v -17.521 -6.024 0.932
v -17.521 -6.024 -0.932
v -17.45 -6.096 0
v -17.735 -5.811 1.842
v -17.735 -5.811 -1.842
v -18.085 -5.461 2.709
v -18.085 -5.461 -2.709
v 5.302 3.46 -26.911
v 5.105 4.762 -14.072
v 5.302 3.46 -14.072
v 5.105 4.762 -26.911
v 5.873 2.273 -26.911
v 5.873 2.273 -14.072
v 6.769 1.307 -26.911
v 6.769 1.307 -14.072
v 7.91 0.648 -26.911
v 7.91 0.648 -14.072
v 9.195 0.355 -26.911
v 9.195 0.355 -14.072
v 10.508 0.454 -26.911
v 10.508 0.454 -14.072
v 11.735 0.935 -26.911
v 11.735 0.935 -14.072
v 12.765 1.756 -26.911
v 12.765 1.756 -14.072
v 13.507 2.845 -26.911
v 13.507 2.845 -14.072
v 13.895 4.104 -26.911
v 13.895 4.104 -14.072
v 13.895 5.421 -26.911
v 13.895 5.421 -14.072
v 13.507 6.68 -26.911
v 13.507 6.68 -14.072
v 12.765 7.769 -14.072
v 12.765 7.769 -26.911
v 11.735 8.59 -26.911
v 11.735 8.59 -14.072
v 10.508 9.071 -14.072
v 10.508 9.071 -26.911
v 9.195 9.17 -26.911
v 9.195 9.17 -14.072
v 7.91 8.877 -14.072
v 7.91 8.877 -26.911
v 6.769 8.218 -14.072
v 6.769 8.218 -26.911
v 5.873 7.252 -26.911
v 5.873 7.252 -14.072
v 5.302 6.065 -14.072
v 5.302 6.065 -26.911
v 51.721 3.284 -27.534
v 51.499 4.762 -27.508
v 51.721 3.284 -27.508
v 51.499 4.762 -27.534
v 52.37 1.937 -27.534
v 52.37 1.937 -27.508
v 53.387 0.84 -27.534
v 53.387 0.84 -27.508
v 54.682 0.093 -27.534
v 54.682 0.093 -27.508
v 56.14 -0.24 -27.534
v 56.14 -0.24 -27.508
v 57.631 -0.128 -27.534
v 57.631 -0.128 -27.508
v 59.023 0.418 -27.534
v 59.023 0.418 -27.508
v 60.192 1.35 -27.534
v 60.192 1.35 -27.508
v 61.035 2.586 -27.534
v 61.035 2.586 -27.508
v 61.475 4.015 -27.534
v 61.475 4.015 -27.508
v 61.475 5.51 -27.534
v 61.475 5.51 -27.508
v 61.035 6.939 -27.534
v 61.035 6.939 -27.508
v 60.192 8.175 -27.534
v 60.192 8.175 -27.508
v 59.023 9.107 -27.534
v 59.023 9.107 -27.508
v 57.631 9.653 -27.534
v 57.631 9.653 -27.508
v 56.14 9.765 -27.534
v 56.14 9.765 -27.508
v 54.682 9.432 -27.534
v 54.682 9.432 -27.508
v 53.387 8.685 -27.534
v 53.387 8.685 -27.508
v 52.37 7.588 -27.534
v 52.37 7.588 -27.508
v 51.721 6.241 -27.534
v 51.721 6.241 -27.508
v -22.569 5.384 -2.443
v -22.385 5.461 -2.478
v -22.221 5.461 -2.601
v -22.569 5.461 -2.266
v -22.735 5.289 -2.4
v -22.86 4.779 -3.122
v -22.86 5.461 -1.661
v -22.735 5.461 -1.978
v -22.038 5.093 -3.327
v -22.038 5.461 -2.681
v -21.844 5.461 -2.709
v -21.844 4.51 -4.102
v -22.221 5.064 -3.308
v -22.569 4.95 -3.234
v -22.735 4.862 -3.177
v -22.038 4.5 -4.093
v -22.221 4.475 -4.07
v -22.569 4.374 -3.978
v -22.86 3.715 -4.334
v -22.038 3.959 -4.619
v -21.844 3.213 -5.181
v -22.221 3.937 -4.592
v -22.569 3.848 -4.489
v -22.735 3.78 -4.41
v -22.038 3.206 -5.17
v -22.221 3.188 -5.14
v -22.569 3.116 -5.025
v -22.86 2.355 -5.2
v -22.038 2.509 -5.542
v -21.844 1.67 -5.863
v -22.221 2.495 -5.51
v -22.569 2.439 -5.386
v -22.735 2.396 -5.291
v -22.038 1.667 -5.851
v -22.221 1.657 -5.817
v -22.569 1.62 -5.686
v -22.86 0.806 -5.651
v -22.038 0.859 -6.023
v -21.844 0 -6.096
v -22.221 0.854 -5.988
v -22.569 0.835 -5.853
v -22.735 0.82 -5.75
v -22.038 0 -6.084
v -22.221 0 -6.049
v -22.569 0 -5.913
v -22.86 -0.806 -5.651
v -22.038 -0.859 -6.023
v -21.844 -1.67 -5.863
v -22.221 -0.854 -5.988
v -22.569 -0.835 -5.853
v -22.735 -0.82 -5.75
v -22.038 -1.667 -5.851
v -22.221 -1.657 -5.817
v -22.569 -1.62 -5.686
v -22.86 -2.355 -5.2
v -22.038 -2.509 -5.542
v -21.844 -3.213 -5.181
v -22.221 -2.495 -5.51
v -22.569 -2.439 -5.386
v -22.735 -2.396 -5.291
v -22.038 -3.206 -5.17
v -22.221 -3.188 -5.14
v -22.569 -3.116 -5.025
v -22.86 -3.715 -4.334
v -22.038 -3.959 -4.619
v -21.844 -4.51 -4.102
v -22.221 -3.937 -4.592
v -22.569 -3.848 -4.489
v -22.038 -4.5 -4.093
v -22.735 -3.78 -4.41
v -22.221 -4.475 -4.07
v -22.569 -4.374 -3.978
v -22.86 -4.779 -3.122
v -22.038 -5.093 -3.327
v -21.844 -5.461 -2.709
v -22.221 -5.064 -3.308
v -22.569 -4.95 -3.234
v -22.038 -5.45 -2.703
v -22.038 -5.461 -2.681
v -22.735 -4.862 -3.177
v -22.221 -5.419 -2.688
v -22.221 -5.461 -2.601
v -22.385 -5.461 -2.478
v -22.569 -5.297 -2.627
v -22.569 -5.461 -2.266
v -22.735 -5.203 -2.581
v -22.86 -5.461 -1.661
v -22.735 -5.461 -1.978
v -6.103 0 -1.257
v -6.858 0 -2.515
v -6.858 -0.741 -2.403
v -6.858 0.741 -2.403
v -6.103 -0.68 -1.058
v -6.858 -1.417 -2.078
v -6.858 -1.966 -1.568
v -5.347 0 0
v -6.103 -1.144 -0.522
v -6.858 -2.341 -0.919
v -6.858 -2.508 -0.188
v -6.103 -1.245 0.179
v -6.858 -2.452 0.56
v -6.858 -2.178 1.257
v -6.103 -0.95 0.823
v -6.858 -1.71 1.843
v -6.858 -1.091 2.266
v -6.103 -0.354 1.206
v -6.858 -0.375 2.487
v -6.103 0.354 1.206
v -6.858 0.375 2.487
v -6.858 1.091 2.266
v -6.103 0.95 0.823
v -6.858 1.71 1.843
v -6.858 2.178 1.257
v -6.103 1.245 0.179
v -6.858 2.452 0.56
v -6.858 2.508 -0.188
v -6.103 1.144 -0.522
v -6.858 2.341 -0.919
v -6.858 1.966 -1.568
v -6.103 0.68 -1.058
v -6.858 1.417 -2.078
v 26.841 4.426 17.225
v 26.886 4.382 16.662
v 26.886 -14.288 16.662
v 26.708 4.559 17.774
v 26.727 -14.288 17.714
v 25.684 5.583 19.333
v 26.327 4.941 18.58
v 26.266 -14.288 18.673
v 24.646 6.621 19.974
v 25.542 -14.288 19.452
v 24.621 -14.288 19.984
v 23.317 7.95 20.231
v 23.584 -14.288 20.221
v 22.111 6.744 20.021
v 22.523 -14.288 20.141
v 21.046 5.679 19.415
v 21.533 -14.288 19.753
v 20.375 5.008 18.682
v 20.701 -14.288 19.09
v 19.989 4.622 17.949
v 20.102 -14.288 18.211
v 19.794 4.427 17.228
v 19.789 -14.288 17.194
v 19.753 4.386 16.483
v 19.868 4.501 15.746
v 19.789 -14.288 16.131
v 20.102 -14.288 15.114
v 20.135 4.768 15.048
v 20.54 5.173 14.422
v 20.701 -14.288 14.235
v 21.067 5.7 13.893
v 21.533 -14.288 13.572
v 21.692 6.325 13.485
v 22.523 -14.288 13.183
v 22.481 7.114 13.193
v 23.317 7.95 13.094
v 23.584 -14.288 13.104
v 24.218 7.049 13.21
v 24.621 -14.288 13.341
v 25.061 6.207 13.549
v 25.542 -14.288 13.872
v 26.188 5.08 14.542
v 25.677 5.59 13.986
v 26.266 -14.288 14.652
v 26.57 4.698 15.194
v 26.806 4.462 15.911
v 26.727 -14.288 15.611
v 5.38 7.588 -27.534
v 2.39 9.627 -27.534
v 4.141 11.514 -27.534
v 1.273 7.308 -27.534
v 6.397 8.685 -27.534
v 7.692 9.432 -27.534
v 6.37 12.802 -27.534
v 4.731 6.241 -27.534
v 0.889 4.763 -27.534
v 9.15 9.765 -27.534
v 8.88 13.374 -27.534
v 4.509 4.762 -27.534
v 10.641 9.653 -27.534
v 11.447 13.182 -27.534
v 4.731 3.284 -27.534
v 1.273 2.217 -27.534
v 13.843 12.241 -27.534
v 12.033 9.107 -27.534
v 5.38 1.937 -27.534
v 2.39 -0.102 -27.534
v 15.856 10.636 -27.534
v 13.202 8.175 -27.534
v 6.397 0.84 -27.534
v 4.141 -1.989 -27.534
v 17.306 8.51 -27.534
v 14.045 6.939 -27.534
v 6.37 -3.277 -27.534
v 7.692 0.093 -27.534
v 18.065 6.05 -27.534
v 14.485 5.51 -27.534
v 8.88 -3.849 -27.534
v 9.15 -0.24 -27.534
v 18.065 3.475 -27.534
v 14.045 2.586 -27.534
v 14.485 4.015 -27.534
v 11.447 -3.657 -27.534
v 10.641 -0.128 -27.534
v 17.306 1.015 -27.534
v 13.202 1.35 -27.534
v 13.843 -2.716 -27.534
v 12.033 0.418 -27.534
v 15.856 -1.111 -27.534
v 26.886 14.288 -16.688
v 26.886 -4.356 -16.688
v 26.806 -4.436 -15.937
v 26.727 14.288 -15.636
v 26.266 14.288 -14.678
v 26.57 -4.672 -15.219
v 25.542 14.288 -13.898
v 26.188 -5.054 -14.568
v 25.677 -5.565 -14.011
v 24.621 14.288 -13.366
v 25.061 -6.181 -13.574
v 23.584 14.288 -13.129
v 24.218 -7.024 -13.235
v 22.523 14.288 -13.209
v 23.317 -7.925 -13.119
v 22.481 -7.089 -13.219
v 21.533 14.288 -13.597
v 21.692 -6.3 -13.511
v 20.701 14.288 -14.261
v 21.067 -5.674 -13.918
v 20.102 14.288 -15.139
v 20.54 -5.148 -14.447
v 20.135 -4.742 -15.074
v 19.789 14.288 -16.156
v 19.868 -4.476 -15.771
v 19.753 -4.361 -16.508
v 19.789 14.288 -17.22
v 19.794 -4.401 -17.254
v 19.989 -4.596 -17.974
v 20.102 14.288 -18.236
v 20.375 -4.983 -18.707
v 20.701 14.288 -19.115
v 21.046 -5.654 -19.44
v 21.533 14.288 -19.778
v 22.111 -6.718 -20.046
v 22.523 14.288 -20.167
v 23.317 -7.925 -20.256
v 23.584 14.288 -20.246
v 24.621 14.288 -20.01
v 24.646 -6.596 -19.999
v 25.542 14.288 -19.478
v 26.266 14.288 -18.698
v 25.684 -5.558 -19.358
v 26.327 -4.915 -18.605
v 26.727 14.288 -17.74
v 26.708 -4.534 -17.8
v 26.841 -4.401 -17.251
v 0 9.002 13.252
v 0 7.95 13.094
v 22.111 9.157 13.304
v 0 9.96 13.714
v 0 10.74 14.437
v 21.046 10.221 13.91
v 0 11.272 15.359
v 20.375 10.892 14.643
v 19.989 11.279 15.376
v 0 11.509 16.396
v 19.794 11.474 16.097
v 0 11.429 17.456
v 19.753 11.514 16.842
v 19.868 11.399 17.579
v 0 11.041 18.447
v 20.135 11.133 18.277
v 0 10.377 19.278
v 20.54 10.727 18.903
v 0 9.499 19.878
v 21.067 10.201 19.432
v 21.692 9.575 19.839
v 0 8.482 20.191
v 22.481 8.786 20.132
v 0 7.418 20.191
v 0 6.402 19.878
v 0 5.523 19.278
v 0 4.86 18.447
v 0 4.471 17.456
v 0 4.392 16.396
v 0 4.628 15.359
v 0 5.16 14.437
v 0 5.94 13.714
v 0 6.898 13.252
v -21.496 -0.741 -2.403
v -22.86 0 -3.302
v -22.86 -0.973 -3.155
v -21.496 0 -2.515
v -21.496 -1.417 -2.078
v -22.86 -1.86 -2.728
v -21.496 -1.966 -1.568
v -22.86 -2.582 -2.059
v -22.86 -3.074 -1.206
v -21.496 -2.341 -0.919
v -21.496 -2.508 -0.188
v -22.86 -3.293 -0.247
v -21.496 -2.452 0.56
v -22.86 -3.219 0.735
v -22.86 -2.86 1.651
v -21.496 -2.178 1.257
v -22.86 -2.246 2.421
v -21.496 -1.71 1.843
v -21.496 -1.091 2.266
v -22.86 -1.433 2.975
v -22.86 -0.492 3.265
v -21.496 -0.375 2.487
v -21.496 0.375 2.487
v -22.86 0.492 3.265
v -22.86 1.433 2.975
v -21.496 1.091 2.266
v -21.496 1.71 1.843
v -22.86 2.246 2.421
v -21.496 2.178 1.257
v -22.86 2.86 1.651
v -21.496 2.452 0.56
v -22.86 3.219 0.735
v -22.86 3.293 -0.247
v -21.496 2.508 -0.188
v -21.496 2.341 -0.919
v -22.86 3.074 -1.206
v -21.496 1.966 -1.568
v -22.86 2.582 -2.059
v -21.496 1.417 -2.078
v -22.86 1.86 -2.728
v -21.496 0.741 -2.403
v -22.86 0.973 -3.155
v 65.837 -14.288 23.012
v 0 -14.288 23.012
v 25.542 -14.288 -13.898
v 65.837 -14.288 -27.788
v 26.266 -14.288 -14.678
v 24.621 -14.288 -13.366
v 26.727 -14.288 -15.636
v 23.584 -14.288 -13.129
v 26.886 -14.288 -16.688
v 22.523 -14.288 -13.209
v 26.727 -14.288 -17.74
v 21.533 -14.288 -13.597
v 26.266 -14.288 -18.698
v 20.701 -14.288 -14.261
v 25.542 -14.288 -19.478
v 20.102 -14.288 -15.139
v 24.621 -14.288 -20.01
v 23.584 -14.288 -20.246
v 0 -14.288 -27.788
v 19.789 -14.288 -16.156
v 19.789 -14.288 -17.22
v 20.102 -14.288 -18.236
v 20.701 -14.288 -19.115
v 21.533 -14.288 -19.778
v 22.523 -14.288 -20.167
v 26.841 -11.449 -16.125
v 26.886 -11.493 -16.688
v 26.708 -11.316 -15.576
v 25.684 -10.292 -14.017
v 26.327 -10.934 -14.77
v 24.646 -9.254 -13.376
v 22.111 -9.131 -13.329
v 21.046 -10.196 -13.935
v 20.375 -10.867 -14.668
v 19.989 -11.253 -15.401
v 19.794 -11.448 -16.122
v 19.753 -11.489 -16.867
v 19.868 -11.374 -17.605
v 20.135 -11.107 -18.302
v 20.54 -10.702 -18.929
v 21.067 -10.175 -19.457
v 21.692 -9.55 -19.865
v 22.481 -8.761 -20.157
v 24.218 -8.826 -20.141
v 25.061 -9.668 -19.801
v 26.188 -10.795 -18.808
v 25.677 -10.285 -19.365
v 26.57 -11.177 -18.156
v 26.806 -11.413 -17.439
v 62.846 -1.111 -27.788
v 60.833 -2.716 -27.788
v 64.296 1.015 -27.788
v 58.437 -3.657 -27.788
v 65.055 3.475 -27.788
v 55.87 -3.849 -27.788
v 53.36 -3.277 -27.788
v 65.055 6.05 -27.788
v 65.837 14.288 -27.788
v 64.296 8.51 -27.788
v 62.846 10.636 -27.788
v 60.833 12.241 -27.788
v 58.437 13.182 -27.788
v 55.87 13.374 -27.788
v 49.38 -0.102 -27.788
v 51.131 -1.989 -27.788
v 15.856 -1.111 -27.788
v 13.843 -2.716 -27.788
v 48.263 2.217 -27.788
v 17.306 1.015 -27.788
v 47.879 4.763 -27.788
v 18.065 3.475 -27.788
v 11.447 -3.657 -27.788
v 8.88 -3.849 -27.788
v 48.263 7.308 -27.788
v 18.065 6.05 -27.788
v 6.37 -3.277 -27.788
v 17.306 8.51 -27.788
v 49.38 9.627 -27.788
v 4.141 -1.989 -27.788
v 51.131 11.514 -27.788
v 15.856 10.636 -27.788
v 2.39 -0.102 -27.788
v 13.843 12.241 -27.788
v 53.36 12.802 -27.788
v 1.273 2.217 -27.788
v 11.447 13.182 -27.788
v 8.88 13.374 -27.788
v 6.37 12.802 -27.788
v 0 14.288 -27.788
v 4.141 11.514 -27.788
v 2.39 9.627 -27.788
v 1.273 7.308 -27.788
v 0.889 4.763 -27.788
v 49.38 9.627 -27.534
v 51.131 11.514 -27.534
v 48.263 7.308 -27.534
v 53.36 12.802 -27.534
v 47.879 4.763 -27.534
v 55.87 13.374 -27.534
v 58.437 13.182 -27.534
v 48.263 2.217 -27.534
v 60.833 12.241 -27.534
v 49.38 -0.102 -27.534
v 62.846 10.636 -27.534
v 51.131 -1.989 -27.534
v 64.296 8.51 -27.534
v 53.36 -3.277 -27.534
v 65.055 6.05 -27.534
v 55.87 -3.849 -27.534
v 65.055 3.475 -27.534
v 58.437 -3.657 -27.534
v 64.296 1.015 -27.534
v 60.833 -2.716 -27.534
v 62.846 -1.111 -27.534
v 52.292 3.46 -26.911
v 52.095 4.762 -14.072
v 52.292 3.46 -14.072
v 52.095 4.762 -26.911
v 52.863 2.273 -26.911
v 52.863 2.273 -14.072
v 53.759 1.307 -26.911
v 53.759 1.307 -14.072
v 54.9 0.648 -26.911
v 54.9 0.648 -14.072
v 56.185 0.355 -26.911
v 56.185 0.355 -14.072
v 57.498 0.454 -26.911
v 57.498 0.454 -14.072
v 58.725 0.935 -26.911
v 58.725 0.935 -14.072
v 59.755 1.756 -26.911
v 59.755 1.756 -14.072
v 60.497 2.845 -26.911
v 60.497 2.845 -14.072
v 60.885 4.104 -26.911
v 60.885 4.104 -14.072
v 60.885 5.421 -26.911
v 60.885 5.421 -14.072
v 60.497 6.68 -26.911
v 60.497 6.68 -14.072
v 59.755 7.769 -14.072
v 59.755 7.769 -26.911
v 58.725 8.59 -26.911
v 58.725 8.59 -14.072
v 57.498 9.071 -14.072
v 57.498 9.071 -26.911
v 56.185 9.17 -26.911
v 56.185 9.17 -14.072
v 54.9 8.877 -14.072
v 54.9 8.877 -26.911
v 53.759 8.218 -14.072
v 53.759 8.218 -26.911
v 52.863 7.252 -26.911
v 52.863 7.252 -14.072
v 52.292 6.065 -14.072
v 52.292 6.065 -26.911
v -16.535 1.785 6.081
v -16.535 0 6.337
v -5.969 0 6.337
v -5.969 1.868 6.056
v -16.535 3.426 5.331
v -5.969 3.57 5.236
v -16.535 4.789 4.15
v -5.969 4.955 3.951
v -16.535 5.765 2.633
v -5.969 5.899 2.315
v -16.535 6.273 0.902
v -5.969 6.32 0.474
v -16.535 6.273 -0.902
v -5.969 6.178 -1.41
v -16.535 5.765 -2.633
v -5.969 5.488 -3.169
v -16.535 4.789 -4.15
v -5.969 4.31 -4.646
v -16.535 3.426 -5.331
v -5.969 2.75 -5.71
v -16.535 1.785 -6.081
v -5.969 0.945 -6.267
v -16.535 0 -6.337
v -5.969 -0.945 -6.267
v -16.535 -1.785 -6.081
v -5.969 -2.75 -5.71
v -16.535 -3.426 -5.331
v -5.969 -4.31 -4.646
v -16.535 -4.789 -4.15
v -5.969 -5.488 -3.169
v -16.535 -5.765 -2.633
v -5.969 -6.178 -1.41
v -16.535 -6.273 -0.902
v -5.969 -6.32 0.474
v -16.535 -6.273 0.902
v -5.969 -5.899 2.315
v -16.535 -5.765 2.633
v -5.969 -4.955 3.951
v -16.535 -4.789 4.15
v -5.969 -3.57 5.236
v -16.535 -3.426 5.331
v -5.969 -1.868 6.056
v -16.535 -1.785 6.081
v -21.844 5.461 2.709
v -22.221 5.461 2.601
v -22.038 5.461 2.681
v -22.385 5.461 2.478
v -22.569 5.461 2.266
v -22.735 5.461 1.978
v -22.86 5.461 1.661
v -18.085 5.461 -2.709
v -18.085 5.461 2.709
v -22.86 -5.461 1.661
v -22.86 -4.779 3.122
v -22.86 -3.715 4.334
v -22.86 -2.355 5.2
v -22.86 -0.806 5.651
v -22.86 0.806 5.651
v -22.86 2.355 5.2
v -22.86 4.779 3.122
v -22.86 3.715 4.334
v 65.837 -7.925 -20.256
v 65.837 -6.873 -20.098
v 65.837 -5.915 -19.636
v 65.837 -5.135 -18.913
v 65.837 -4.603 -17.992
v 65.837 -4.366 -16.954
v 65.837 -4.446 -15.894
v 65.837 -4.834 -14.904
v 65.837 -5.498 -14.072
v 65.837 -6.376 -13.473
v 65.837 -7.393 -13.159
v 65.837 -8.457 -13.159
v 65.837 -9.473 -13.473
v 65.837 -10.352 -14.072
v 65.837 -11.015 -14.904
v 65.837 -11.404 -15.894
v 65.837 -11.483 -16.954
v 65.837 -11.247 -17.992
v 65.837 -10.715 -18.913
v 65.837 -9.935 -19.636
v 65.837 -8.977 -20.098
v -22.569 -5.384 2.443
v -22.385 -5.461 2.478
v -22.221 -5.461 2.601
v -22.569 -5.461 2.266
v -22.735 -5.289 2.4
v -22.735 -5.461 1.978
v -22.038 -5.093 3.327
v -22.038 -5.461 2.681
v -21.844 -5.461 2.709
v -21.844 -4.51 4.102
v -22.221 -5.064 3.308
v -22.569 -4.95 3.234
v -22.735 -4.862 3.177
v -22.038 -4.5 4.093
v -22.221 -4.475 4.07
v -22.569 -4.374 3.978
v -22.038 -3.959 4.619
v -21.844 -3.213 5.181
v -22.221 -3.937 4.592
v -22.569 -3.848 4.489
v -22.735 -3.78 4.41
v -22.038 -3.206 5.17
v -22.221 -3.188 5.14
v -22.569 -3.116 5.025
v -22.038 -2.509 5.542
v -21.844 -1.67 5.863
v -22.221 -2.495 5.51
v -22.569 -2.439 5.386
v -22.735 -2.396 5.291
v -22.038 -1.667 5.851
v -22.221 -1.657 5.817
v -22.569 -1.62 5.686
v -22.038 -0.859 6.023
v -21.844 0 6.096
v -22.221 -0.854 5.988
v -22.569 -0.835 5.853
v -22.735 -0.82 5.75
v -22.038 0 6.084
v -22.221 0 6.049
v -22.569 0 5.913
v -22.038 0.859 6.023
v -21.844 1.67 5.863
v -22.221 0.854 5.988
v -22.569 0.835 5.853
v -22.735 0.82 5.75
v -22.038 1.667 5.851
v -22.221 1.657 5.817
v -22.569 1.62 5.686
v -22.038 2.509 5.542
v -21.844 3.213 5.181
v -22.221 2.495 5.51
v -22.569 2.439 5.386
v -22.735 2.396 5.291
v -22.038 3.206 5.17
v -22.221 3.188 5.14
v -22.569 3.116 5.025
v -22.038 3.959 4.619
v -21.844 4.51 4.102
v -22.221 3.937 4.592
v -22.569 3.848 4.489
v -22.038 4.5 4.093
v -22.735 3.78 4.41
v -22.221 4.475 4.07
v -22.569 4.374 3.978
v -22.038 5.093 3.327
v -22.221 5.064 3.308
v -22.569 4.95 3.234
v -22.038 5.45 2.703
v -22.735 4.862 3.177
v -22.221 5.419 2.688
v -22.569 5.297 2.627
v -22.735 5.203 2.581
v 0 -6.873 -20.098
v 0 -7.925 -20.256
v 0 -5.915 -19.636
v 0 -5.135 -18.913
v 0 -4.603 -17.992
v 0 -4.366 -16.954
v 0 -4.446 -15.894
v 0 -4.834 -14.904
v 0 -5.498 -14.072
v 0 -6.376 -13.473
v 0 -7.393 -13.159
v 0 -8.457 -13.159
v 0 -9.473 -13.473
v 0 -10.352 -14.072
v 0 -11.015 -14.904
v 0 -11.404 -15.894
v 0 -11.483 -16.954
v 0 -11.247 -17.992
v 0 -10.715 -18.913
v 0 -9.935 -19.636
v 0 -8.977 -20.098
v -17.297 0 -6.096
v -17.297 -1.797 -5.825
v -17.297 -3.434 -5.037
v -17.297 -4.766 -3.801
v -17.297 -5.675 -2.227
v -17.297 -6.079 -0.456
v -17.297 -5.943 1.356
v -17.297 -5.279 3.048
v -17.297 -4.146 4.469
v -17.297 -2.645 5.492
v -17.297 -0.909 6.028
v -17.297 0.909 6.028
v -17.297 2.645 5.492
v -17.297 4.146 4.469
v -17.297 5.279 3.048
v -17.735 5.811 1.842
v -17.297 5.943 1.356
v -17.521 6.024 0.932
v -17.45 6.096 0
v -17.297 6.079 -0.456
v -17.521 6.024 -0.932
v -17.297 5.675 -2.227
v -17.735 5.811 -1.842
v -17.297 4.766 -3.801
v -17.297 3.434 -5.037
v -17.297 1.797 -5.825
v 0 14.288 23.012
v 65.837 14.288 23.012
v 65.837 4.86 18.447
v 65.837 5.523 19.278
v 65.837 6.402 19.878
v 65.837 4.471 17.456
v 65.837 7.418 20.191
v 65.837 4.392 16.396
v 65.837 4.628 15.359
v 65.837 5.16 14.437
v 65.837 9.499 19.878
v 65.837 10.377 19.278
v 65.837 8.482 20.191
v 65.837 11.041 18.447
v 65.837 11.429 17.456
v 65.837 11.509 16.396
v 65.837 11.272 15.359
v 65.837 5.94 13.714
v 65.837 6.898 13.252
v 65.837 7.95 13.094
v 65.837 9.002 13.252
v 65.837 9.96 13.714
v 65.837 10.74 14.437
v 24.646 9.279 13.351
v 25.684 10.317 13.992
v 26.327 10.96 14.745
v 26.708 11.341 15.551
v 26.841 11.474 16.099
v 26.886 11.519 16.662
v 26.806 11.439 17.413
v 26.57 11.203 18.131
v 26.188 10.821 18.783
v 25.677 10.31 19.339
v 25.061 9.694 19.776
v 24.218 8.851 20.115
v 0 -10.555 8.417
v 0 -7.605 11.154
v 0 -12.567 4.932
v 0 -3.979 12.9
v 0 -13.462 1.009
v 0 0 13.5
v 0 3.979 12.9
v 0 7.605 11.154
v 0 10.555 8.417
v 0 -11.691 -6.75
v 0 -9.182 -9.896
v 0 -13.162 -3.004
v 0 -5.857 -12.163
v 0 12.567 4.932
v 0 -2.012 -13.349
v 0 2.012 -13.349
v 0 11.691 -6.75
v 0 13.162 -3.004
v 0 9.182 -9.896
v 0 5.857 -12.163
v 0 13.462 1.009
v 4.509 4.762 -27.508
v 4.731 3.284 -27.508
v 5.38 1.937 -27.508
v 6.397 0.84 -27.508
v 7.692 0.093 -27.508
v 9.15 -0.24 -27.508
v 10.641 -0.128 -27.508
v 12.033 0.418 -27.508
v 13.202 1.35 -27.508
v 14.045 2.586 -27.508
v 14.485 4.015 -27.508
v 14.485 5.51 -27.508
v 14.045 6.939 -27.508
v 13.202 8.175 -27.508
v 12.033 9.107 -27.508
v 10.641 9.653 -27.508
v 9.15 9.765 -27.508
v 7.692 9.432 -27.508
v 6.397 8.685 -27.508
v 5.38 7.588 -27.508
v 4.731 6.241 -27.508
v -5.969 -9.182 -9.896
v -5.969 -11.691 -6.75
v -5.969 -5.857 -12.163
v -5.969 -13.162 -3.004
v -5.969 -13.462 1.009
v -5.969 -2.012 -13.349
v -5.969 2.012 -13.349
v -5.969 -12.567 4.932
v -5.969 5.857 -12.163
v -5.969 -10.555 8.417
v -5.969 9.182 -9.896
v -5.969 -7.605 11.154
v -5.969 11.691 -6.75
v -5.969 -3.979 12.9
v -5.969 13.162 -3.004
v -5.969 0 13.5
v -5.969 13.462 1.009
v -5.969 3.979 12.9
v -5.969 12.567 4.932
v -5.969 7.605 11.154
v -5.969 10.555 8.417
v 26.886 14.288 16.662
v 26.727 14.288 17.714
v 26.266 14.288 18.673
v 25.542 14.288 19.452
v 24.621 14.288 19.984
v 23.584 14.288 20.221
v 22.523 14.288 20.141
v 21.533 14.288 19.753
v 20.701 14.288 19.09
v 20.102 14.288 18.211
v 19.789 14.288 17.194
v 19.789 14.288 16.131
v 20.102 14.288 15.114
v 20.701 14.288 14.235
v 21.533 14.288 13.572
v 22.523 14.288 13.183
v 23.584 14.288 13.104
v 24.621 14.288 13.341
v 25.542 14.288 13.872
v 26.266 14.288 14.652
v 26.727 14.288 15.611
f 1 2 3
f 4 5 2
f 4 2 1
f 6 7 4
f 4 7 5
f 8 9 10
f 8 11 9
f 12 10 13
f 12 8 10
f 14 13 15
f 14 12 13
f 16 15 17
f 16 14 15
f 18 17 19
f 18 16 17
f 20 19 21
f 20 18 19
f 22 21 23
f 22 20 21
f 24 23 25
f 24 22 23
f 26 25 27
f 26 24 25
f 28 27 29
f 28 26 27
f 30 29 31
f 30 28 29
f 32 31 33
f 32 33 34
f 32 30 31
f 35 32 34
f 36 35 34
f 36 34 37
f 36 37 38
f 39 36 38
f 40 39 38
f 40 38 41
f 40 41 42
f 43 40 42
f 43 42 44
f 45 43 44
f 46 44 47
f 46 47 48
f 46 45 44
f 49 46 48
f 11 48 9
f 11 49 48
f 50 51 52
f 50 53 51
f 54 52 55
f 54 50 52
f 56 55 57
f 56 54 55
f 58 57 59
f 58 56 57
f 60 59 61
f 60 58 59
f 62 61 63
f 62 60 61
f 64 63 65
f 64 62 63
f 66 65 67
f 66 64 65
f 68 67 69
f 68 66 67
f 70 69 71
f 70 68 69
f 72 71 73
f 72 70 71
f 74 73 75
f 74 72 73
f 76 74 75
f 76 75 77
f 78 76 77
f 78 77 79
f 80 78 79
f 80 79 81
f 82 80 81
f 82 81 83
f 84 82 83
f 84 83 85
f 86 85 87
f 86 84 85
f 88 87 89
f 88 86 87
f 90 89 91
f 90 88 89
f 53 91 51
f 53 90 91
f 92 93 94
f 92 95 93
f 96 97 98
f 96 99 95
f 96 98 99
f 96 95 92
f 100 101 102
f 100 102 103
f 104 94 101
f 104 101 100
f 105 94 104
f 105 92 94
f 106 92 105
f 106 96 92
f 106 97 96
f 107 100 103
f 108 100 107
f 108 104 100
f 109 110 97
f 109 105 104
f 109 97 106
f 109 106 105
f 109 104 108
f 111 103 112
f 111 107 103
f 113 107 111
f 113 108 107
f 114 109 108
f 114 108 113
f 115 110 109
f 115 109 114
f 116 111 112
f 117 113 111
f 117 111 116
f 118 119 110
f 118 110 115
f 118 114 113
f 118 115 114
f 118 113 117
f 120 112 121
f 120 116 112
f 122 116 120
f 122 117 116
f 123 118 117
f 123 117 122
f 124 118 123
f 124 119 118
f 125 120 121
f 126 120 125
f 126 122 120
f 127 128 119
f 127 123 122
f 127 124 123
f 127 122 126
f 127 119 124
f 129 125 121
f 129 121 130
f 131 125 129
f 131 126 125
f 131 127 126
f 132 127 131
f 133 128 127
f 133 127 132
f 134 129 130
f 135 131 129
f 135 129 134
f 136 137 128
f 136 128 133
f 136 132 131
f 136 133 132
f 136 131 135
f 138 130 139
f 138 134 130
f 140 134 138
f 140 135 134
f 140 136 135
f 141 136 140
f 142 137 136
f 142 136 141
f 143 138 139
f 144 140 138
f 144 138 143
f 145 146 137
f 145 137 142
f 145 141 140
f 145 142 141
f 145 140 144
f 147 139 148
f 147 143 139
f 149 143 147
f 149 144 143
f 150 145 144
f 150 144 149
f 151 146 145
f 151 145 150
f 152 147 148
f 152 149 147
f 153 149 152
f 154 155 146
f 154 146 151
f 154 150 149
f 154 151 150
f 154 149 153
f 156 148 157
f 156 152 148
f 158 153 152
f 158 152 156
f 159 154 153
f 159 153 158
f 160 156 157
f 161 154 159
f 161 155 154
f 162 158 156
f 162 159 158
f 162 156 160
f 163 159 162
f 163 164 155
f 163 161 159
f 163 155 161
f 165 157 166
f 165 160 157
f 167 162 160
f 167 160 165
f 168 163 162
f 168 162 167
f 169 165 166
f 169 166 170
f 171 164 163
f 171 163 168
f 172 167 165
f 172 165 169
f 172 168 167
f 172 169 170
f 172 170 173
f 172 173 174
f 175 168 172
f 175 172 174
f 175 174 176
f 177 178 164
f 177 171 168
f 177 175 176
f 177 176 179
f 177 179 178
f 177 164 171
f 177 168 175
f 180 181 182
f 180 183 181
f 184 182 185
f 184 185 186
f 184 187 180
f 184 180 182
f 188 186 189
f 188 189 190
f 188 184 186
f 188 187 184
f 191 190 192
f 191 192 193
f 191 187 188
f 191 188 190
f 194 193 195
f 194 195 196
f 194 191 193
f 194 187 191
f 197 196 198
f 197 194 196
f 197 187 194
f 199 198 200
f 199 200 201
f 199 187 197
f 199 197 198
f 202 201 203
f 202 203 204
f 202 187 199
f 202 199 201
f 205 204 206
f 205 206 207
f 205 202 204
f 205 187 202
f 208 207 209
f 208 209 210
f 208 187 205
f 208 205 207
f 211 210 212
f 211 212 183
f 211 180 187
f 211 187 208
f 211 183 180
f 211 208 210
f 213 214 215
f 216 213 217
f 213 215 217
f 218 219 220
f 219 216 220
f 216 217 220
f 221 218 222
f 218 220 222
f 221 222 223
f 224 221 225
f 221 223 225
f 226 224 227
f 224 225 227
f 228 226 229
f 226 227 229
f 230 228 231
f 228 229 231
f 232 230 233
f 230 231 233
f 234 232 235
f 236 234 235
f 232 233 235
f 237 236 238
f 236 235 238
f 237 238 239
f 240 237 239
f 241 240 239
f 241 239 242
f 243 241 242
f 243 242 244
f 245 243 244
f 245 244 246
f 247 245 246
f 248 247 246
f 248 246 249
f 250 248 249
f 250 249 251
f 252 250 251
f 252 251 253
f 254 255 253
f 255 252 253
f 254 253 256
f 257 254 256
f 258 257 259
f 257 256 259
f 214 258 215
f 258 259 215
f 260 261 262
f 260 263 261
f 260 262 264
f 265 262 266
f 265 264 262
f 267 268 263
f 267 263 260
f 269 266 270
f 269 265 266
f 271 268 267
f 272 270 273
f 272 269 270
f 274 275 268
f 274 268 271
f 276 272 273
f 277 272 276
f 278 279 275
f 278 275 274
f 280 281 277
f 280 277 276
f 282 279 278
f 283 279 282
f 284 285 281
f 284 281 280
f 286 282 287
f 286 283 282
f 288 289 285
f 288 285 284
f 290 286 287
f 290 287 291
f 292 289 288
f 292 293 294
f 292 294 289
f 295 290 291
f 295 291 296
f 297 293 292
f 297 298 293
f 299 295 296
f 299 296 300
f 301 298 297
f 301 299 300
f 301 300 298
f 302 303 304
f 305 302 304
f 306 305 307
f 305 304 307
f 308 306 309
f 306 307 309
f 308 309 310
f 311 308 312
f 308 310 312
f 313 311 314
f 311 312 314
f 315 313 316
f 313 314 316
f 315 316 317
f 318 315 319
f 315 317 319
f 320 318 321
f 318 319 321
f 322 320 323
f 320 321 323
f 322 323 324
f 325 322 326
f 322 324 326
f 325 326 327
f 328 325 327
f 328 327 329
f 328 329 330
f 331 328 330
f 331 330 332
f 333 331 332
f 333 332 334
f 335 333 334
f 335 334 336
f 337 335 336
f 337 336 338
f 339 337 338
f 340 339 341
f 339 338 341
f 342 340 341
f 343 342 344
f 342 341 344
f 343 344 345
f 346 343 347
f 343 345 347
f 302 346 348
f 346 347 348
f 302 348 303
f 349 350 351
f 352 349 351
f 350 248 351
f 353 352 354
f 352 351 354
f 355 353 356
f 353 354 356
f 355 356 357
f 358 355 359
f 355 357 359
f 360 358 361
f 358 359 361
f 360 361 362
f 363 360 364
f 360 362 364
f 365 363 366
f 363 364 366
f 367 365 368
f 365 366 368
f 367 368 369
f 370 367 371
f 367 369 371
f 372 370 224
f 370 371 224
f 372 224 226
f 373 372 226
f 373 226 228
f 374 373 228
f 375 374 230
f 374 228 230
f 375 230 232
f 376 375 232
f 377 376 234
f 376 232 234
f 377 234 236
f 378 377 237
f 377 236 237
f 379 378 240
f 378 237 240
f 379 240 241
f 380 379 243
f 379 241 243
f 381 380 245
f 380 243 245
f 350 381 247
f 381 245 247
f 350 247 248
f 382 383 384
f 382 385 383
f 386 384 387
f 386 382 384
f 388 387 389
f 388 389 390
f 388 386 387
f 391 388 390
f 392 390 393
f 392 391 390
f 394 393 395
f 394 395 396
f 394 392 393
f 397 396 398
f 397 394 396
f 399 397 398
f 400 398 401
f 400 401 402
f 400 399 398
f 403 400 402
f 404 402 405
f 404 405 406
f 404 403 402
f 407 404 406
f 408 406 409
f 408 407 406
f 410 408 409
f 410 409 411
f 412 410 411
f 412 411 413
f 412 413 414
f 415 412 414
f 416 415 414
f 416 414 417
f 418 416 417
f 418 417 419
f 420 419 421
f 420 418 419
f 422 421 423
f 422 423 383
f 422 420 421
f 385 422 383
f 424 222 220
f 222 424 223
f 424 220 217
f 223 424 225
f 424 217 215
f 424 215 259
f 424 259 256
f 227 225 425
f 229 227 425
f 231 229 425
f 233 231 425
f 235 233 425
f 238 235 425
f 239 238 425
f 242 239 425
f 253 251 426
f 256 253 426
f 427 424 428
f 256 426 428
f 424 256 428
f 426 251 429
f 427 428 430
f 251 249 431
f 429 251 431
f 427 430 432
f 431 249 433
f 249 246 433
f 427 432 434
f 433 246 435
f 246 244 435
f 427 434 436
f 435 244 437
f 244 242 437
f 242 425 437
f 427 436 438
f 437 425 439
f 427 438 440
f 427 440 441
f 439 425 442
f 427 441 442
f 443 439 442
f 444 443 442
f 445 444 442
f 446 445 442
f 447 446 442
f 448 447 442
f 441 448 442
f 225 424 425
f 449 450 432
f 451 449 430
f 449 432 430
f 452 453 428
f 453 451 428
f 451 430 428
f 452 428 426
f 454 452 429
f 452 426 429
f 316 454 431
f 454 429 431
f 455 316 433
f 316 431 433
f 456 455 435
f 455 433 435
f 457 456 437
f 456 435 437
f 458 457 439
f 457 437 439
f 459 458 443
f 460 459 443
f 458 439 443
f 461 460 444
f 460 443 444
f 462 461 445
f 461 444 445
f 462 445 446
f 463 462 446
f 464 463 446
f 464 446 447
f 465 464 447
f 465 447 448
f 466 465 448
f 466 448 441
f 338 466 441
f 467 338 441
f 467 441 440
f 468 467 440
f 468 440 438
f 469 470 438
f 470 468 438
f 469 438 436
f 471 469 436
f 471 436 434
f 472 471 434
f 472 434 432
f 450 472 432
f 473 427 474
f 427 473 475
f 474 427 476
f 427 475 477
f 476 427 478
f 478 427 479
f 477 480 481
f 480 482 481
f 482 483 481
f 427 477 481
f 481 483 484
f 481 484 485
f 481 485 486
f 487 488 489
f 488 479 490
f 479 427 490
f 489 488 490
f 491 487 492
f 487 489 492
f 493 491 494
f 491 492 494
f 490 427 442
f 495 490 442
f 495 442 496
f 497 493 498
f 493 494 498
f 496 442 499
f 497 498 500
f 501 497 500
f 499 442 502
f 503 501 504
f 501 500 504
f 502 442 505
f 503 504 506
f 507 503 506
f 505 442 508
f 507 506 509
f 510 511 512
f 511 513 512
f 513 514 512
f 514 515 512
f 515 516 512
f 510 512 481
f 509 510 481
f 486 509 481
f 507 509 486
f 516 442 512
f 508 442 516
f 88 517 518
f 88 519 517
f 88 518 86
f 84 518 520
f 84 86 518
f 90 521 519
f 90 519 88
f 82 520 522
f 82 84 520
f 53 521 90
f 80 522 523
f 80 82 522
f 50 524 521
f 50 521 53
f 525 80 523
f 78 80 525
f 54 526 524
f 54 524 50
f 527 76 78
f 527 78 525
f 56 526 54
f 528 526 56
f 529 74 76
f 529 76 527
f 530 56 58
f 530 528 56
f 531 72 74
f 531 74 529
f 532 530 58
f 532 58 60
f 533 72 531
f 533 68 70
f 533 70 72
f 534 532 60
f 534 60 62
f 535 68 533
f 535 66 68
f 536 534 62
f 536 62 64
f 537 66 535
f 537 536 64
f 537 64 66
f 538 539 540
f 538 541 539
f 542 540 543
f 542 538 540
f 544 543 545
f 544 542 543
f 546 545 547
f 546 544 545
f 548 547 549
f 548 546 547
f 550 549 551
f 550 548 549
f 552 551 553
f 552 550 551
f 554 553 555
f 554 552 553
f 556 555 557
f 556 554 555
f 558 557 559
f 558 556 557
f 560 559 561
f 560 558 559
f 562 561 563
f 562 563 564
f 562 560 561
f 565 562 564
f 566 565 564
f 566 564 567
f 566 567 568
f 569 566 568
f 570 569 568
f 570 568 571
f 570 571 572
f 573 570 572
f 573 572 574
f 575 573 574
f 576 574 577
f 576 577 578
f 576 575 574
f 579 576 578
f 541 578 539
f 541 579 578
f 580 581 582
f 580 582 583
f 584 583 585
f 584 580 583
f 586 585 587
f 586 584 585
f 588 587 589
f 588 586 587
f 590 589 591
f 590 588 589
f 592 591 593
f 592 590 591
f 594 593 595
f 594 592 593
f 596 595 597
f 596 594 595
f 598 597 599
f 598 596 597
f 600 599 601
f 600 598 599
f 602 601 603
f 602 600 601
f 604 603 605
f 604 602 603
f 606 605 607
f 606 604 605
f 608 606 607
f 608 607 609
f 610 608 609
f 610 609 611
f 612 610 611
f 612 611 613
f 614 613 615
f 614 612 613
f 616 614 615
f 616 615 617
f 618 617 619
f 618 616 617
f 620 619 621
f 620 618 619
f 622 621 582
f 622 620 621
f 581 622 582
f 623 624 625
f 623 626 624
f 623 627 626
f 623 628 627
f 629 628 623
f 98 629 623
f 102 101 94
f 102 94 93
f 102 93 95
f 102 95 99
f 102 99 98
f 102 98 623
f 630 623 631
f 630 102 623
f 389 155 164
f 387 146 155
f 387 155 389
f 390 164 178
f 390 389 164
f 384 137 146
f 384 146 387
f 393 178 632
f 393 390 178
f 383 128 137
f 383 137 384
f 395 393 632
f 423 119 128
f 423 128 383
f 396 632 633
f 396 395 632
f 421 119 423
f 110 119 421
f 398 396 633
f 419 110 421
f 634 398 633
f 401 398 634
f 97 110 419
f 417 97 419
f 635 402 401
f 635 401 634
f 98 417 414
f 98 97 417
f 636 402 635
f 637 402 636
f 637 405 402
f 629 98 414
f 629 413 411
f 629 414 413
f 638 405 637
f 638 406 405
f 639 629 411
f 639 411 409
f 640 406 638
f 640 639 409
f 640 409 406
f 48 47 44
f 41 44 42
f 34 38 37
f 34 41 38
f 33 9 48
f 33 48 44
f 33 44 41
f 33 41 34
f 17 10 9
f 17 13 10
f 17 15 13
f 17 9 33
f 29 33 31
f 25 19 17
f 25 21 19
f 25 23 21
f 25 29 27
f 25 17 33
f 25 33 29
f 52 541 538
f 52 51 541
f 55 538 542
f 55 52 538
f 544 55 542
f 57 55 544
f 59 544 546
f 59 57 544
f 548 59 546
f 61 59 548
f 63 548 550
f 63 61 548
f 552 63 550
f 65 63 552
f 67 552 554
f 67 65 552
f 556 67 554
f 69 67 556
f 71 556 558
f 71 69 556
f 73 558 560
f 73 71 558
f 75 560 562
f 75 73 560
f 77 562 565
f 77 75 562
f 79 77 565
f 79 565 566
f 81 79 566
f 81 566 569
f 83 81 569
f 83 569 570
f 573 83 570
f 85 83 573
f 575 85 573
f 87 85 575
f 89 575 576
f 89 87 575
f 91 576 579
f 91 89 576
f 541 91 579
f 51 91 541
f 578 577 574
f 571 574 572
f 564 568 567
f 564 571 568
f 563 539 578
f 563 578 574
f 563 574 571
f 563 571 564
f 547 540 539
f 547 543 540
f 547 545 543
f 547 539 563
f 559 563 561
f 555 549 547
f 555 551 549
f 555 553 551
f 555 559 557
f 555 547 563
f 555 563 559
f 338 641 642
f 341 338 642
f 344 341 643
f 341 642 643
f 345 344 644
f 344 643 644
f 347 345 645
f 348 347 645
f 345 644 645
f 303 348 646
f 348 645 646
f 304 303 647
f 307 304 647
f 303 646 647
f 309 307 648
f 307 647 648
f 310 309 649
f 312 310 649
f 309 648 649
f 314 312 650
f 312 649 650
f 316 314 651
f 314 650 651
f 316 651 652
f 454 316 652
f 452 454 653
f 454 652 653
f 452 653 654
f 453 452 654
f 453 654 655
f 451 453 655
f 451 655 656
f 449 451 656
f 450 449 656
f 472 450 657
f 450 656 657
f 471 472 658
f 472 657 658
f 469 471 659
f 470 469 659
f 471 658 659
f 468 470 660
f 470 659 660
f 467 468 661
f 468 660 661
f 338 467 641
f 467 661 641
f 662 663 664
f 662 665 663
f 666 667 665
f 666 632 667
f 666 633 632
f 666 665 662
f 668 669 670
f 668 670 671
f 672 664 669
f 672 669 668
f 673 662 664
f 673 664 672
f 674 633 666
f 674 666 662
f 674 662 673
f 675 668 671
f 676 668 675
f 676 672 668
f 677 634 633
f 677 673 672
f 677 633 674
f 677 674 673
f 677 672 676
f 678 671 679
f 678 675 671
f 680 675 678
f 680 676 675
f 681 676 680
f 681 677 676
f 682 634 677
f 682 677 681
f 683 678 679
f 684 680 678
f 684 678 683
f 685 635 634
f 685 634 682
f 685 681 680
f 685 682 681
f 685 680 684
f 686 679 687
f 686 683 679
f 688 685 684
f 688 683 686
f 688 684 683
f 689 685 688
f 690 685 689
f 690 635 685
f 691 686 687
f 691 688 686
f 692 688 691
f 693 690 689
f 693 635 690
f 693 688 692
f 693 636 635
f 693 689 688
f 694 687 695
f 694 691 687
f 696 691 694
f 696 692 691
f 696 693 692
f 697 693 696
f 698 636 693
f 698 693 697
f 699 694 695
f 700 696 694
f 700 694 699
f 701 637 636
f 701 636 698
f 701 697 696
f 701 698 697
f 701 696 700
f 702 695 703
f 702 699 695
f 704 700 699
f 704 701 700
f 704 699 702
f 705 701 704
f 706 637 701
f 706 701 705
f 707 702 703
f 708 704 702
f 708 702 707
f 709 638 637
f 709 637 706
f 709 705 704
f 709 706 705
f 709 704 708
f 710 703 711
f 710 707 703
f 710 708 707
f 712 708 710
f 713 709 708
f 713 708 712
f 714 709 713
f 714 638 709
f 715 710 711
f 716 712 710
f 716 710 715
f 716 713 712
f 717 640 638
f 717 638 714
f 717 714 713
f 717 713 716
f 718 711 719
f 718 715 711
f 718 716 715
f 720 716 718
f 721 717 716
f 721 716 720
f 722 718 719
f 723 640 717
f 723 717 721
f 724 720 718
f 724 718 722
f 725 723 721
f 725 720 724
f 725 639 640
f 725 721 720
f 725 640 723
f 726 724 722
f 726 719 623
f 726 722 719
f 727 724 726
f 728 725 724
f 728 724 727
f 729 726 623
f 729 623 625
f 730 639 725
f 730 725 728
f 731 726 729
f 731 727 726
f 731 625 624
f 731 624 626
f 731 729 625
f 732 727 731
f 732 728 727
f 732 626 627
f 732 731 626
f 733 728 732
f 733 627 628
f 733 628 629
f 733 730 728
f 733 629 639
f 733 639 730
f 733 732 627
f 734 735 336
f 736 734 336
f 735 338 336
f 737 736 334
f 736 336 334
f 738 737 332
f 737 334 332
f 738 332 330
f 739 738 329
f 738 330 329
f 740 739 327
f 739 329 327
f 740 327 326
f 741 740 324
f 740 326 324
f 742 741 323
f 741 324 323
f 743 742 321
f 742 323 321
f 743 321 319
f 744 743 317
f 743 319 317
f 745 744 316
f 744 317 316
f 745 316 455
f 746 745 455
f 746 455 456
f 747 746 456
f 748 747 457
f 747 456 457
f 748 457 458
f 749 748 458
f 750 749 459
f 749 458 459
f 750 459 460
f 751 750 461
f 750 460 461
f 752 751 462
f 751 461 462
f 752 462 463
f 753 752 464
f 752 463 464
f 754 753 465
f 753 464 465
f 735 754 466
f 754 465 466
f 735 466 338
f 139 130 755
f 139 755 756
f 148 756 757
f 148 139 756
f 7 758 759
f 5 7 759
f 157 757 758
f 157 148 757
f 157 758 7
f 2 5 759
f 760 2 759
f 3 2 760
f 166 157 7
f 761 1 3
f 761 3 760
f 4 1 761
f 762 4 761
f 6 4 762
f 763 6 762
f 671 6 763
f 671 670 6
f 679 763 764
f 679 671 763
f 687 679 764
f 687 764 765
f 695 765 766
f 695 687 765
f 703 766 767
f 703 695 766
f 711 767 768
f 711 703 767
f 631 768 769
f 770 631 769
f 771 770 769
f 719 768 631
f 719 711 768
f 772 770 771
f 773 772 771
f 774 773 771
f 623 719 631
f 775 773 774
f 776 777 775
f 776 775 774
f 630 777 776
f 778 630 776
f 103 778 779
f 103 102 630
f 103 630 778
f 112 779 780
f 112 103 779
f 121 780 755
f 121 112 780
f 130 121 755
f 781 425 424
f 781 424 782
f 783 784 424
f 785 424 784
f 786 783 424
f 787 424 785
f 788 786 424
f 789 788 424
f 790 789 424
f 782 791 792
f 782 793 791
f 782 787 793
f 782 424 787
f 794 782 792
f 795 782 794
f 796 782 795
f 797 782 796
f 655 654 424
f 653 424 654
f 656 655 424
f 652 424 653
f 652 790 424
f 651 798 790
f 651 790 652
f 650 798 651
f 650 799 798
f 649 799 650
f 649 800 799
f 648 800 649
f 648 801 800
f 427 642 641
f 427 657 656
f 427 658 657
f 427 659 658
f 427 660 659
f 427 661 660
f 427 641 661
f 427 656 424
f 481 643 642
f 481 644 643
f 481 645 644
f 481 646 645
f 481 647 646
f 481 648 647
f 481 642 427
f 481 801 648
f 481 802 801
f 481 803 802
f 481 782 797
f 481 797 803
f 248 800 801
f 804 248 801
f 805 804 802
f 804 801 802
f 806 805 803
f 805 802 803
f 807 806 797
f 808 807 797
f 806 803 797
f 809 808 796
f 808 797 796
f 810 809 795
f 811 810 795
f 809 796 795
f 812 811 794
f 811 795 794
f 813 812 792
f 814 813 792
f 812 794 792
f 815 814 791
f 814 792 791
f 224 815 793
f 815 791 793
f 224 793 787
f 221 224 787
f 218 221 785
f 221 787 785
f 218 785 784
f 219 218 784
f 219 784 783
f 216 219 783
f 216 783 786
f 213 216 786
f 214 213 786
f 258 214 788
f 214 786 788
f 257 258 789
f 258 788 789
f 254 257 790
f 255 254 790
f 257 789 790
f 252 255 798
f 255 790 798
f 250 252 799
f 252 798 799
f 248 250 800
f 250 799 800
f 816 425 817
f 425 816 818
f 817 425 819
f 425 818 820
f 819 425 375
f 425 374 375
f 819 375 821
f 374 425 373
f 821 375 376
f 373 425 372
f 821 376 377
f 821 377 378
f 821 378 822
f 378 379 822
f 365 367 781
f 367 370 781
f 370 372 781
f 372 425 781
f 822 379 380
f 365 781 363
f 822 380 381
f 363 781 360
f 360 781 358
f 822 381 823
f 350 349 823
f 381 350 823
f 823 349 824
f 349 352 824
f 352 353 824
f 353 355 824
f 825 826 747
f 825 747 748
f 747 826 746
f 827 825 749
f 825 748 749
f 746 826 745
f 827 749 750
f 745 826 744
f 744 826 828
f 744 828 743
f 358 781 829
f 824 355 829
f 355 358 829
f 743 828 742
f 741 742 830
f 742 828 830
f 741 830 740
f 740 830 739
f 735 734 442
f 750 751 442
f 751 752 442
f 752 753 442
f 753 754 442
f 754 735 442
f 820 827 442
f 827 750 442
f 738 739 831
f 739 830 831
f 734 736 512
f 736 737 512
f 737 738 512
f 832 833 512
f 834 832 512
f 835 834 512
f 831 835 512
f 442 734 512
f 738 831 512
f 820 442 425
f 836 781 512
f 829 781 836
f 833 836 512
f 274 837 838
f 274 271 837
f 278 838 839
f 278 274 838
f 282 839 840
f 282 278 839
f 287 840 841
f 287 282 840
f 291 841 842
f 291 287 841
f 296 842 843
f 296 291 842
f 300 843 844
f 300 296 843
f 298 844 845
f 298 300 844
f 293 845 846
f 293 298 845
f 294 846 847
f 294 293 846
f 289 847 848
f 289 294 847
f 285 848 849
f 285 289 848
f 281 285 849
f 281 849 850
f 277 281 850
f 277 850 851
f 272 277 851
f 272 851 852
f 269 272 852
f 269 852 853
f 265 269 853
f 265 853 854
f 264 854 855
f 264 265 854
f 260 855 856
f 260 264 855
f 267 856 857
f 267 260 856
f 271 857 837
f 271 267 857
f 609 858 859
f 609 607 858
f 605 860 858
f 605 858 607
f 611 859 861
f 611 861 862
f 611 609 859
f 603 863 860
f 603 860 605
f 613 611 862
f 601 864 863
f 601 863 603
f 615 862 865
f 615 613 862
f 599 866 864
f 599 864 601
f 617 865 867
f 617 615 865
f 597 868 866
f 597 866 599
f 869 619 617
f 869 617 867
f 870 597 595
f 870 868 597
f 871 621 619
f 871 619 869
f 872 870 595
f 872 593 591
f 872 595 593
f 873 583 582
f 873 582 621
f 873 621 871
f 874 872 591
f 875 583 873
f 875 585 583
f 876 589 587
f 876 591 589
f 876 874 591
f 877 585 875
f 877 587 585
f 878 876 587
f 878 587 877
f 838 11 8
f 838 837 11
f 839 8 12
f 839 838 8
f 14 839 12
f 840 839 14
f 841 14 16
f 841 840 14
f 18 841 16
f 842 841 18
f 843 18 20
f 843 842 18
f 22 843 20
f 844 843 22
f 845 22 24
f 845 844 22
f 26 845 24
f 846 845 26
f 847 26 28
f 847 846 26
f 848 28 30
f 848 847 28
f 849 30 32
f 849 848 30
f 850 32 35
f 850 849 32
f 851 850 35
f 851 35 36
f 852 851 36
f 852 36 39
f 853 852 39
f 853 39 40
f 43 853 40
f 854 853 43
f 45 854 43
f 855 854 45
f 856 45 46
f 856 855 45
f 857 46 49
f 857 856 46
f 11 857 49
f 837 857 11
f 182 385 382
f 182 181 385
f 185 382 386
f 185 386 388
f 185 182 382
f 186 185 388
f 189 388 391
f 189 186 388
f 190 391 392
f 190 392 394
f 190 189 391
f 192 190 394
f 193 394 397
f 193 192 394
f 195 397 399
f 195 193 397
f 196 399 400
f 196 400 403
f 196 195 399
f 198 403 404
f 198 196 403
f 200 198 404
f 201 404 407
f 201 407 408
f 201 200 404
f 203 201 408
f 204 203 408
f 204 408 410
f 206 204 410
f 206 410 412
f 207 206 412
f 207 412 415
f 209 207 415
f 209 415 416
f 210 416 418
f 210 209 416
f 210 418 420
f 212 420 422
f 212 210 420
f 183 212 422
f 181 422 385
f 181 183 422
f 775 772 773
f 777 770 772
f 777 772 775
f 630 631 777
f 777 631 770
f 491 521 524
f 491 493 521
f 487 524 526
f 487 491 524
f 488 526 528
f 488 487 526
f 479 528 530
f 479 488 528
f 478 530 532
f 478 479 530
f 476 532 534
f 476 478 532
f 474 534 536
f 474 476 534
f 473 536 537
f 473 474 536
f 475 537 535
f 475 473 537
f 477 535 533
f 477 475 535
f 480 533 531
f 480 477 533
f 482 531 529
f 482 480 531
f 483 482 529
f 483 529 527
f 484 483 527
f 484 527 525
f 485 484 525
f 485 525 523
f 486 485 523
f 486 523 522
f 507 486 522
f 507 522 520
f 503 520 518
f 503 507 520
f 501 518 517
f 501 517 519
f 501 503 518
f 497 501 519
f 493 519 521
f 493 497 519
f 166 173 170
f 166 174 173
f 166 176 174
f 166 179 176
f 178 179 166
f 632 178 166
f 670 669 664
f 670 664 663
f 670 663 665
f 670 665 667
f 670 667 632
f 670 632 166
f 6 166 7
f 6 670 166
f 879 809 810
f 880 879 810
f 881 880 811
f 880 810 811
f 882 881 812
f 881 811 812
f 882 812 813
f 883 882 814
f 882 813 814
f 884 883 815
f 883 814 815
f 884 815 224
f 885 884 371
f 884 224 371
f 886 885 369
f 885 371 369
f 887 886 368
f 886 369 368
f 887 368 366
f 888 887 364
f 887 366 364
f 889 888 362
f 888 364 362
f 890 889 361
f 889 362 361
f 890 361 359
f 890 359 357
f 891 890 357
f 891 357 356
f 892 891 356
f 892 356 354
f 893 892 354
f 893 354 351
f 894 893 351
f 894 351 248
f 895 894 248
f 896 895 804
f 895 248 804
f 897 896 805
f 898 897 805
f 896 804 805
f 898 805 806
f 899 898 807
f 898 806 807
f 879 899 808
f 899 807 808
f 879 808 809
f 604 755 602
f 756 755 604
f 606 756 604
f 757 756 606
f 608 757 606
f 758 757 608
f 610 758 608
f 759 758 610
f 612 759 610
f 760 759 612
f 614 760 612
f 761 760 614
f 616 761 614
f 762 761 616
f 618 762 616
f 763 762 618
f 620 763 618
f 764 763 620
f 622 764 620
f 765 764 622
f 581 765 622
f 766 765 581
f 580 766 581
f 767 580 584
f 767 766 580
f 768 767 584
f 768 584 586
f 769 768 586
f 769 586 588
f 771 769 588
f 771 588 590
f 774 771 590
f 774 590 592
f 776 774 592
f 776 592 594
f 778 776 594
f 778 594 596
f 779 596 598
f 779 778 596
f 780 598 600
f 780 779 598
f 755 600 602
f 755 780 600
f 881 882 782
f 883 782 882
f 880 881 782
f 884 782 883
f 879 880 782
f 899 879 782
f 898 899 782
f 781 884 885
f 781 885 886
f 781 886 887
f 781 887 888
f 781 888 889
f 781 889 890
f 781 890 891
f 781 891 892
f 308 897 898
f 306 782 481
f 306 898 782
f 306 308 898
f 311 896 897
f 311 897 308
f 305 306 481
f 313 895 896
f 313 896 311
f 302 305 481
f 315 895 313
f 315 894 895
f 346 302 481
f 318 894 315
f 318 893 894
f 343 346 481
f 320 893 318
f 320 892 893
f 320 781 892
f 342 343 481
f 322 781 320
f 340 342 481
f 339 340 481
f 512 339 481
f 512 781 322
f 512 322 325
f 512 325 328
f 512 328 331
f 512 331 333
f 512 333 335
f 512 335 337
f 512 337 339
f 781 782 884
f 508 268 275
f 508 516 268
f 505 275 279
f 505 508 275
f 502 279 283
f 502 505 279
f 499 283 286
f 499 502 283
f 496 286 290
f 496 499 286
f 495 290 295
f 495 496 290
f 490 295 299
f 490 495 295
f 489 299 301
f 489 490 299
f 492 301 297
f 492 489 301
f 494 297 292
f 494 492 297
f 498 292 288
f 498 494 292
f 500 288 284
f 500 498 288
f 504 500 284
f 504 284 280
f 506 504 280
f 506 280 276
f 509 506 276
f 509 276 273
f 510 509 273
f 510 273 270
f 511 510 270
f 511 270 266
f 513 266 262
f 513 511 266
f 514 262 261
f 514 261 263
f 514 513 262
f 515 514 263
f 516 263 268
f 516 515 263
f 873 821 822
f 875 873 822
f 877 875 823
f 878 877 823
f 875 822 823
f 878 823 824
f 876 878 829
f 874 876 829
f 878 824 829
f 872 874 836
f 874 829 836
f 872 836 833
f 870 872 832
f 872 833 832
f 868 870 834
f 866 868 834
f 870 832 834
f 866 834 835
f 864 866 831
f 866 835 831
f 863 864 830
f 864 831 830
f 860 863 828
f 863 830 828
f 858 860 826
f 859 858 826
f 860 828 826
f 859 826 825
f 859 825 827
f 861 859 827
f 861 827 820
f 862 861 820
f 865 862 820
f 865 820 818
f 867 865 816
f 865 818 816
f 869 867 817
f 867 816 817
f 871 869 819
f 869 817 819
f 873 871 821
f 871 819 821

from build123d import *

# Parameters (mm, degrees)
SKETCH1_W          = 50.8
SKETCH1_H          = 28.575
EXTRUDE1_DEPTH     = 65.8368
LPATTERN1_COUNT    = 2
LPATTERN1_PITCH    = 46.99
SKETCH5_R          = 13.5001
EXTRUDE2_DEPTH     = 5.969
SKETCH6_W          = 6.3373
SKETCH6_H          = 16.891
CUT_EXTRUDE4_DEPTH = 30.48
HOLE1_D            = 7.137
HOLE1_DEPTH        = 65.8368
HOLE2_D            = 7.137
HOLE2_DEPTH        = 28.575


with BuildPart() as part:
    # Sketch1 → Extrude1 (new body)
    with BuildSketch(Plane(origin=(0, 0, 0), x_dir=(0, 0, -1), z_dir=(1, 0, 0))):
        with Locations((2.3876, 0)):
            Rectangle(SKETCH1_W, SKETCH1_H)
    extrude(amount=EXTRUDE1_DEPTH)

    # S2D0002 → Cut-Revolve1 (revolve, cut)
    with BuildSketch(Plane(origin=(0, 4.7625, 0), x_dir=(-1, 0, 0), z_dir=(0, 1, 0)), mode=Mode.PRIVATE) as cut_revolve1_sk:
        Polygon((-14.5415, -27.5336), (-18.161, -27.5336), (-18.161, -27.7876), (-9.525, -27.7876), (-9.525, -14.0716), (-13.9446, -14.0716), (-13.9446, -26.9113), (-14.5415, -27.5082), align=None)
    cut_revolve1 = revolve(cut_revolve1_sk.sketch.rotate(Axis((9.525, 4.7625, -19.13842003), (0, 0, 1)), 180), axis=Axis((9.525, 4.7625, -19.13842003), (0, 0, 1)), mode=Mode.SUBTRACT)  # turned: the seam where the file's is

    # LPattern1: Cut-Revolve1 ×2
    with Locations(*[(i * LPATTERN1_PITCH, 0, 0) for i in range(1, LPATTERN1_COUNT)]):
        add(cut_revolve1, mode=Mode.SUBTRACT)

    # Sketch5 → Extrude2 (add)
    with BuildSketch(Plane.ZY):
        Circle(SKETCH5_R)
    extrude(amount=EXTRUDE2_DEPTH)

    # Sketch6 → Revolve1 (revolve)
    with BuildSketch(Plane(origin=(0, 0, 0), x_dir=(0, 0, 1), z_dir=(0, -1, 0)), mode=Mode.PRIVATE) as revolve1_sk:
        with Locations((-3.16865, 14.4145)):
            Rectangle(SKETCH6_W, SKETCH6_H)
    revolve(revolve1_sk.sketch.rotate(Axis((5.754582971, 0, 0), (-1, 0, 0)), 180), axis=Axis((5.754582971, 0, 0), (-1, 0, 0)))  # turned: the seam where the file's is

    # S2D0001 → Cut-Revolve4 (revolve, cut)
    with BuildSketch(Plane(origin=(-18.511260017, 3.2639, 0), x_dir=(0, 1, 0), z_dir=(0, 0, 1)), mode=Mode.PRIVATE) as cut_revolve4_sk:
        Polygon((-0.7493, 2.984923177), (-0.7493, -11.653260017), (-3.2639, -13.16418413), (-3.2639, 4.348739983), (0.0381, 4.348739983), align=None)
    revolve(cut_revolve4_sk.sketch.rotate(Axis((0, 0, 0), (-1, 0, 0)), 90), axis=Axis((0, 0, 0), (-1, 0, 0)), mode=Mode.SUBTRACT)  # turned: the seam where the file's is

    # Sketch8 → Cut-Revolve5 (revolve, cut)
    with BuildSketch(Plane(origin=(0, 0, 0), x_dir=(0, 0, -1), z_dir=(0, 1, 0)), mode=Mode.PRIVATE) as cut_revolve5_sk:
        with BuildLine():
            Line((-6.3373, 16.5354), (-6.096, 17.2974))
            Line((-6.096, 17.2974), (-6.096, 21.844))
            ThreePointArc((-6.096, 21.844), (-5.995678675, 22.387796865), (-5.707922533, 22.86))
            Line((-5.707922533, 22.86), (-6.3373, 22.86))
            Line((-6.3373, 22.86), (-6.3373, 16.5354))
        make_face()
    revolve(cut_revolve5_sk.sketch.rotate(Axis((-12.65936, 0, 0), (-1, 0, 0)), 180), axis=Axis((-12.65936, 0, 0), (-1, 0, 0)), mode=Mode.SUBTRACT)  # turned: the seam where the file's is

    # Sketch12 → Cut-Extrude4 (cut, symmetric)
    with BuildSketch(Plane(origin=(0, 0, 0), x_dir=(0, -1, 0), z_dir=(0, 0, -1))):
        Polygon((5.461, 22.86), (5.461, 18.0848), (6.096, 17.4498), (6.096, 22.86), align=None)
        Polygon((-5.461, 22.86), (-5.461, 18.0848), (-6.096, 17.4498), (-6.096, 22.86), align=None)
    extrude(amount=CUT_EXTRUDE4_DEPTH, both=True, mode=Mode.SUBTRACT)

    # Hole1
    with Locations(Plane.ZY):
        with Locations((-16.6878, -7.9248), (16.6624, 7.9502)):
            Hole(HOLE1_D / 2, depth=HOLE1_DEPTH)

    # Hole2
    with Locations(Plane(origin=(0, 14.2875, 0), x_dir=(-1, 0, 0), z_dir=(0, 1, 0))):
        with Locations((-23.3172, -16.6878), (-23.3172, 16.6624)):
            Hole(HOLE2_D / 2, depth=HOLE2_DEPTH)


solid = part.part
